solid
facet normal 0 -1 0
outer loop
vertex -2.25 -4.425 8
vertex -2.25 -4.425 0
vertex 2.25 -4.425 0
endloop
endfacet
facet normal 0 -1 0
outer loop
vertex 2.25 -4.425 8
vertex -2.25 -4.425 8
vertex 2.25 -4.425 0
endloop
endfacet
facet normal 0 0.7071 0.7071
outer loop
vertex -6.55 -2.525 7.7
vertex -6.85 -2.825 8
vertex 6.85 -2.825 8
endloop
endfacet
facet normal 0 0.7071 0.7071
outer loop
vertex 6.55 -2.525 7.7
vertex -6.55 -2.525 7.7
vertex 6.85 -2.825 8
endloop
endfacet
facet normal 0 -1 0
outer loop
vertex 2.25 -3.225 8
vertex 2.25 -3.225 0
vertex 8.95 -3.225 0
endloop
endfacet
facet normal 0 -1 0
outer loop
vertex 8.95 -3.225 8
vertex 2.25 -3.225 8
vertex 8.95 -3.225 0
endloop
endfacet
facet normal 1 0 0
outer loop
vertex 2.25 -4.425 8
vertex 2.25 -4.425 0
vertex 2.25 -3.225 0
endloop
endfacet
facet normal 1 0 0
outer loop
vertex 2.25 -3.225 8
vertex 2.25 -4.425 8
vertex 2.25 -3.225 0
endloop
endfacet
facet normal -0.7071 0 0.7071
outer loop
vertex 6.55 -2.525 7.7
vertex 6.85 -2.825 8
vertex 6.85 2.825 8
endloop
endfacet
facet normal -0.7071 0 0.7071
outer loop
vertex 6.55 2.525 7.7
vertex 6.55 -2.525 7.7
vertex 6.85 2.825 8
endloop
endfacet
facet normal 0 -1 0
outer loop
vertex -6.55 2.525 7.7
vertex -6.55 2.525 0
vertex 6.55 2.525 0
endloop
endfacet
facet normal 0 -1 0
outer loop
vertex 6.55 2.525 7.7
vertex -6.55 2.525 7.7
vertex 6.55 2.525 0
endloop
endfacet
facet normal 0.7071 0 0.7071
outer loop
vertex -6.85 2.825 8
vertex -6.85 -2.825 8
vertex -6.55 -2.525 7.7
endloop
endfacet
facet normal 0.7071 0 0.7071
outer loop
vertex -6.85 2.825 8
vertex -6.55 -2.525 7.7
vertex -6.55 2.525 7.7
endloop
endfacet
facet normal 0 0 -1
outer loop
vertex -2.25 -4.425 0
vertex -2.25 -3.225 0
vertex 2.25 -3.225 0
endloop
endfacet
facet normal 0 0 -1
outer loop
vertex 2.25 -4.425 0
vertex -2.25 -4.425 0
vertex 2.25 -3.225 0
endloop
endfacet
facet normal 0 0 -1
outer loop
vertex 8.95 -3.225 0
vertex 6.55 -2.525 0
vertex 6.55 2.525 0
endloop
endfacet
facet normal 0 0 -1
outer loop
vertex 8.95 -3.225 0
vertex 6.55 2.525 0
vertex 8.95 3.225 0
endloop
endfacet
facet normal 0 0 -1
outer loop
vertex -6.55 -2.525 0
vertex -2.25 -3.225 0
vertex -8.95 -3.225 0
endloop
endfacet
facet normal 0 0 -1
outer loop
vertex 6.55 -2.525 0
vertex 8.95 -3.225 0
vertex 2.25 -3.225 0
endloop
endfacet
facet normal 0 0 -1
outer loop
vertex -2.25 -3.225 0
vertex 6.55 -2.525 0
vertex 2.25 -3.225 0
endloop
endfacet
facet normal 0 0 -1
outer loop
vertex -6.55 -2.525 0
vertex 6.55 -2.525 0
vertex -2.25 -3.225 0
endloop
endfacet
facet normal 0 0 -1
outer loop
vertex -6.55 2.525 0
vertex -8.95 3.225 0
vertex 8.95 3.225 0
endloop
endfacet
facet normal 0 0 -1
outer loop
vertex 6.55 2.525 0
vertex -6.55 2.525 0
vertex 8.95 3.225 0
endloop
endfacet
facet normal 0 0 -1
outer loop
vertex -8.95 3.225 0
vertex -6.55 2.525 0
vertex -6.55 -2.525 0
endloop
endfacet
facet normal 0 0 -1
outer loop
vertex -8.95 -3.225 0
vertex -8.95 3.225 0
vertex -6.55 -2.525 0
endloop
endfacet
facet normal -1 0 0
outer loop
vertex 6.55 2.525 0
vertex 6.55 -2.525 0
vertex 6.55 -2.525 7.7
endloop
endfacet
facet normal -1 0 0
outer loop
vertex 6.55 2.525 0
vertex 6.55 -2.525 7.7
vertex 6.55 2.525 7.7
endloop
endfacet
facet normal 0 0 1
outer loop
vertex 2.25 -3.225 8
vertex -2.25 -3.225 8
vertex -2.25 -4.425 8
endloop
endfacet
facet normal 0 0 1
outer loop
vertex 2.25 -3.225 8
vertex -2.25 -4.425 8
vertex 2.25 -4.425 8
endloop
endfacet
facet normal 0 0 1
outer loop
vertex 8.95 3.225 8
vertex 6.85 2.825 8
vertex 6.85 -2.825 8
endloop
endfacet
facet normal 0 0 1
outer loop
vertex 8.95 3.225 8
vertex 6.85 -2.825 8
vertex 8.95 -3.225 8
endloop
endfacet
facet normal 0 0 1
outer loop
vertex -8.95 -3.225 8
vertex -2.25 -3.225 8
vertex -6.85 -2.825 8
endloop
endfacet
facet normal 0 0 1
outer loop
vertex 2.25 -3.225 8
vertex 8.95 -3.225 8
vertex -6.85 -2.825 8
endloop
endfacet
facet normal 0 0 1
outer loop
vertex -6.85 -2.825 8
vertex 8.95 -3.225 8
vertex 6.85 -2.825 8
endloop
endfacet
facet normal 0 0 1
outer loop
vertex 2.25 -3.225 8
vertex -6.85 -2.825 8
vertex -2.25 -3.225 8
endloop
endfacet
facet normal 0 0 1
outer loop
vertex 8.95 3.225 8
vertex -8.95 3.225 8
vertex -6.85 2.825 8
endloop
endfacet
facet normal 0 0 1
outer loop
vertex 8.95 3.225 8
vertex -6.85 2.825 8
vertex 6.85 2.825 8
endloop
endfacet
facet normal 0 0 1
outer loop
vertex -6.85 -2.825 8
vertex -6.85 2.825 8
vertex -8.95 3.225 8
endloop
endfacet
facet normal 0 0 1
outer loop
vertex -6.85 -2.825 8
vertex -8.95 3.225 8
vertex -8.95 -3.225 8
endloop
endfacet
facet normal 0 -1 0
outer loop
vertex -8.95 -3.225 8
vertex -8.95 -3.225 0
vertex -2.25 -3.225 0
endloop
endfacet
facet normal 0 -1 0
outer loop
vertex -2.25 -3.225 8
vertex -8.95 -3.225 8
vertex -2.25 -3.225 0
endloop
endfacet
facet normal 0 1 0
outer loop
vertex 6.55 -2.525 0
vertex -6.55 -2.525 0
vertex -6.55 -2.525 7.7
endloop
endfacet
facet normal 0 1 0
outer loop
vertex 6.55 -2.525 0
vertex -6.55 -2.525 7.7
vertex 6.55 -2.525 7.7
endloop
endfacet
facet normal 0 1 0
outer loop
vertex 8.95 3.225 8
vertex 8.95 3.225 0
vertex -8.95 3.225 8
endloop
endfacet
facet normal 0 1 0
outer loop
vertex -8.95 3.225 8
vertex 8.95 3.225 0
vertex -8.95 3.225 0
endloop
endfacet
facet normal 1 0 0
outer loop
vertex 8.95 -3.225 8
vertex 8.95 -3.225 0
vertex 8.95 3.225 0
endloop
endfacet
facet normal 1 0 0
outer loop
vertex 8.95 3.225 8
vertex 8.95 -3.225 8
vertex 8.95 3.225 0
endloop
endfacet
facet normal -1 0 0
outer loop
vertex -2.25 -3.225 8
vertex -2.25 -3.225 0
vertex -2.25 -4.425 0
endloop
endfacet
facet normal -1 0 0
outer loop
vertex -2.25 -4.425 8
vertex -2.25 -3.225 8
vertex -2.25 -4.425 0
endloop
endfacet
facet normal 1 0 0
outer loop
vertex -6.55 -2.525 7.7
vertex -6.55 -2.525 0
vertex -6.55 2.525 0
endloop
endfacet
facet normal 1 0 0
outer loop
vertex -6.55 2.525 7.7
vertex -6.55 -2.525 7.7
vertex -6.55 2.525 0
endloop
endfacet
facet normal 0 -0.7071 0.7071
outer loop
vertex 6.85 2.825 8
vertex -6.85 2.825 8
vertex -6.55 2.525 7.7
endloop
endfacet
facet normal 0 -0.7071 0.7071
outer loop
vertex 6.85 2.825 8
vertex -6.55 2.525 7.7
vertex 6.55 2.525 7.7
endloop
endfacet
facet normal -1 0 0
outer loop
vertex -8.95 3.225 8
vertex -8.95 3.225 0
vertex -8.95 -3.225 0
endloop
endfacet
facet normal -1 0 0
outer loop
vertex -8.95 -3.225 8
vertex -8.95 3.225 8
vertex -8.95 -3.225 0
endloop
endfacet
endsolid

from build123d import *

# Parameters (mm, degrees)
SKETCH_W     = 13.1
SKETCH_H     = 5.05
PAD_DEPTH    = 8
CHAMFER_SIZE = 0.3


with BuildPart() as part:
    # Sketch → Pad (new body)
    with BuildSketch(Plane.XY):
        Polygon((-8.95, 3.225), (-8.95, -3.225), (-2.25, -3.225), (-2.25, -4.425), (2.25, -4.425), (2.25, -3.225), (8.95, -3.225), (8.95, 3.225), align=None)
        Rectangle(SKETCH_W, SKETCH_H, mode=Mode.SUBTRACT)
    extrude(amount=PAD_DEPTH)

    # Chamfer
    chamfer_edges = [part.edges().sort_by_distance(p)[0] for p in [
        (6.55, 0, 8),
        (0, 2.525, 8),
        (-6.55, 0, 8),
        (0, -2.525, 8),
    ]]
    chamfer(chamfer_edges, length=CHAMFER_SIZE)


solid = part.part
